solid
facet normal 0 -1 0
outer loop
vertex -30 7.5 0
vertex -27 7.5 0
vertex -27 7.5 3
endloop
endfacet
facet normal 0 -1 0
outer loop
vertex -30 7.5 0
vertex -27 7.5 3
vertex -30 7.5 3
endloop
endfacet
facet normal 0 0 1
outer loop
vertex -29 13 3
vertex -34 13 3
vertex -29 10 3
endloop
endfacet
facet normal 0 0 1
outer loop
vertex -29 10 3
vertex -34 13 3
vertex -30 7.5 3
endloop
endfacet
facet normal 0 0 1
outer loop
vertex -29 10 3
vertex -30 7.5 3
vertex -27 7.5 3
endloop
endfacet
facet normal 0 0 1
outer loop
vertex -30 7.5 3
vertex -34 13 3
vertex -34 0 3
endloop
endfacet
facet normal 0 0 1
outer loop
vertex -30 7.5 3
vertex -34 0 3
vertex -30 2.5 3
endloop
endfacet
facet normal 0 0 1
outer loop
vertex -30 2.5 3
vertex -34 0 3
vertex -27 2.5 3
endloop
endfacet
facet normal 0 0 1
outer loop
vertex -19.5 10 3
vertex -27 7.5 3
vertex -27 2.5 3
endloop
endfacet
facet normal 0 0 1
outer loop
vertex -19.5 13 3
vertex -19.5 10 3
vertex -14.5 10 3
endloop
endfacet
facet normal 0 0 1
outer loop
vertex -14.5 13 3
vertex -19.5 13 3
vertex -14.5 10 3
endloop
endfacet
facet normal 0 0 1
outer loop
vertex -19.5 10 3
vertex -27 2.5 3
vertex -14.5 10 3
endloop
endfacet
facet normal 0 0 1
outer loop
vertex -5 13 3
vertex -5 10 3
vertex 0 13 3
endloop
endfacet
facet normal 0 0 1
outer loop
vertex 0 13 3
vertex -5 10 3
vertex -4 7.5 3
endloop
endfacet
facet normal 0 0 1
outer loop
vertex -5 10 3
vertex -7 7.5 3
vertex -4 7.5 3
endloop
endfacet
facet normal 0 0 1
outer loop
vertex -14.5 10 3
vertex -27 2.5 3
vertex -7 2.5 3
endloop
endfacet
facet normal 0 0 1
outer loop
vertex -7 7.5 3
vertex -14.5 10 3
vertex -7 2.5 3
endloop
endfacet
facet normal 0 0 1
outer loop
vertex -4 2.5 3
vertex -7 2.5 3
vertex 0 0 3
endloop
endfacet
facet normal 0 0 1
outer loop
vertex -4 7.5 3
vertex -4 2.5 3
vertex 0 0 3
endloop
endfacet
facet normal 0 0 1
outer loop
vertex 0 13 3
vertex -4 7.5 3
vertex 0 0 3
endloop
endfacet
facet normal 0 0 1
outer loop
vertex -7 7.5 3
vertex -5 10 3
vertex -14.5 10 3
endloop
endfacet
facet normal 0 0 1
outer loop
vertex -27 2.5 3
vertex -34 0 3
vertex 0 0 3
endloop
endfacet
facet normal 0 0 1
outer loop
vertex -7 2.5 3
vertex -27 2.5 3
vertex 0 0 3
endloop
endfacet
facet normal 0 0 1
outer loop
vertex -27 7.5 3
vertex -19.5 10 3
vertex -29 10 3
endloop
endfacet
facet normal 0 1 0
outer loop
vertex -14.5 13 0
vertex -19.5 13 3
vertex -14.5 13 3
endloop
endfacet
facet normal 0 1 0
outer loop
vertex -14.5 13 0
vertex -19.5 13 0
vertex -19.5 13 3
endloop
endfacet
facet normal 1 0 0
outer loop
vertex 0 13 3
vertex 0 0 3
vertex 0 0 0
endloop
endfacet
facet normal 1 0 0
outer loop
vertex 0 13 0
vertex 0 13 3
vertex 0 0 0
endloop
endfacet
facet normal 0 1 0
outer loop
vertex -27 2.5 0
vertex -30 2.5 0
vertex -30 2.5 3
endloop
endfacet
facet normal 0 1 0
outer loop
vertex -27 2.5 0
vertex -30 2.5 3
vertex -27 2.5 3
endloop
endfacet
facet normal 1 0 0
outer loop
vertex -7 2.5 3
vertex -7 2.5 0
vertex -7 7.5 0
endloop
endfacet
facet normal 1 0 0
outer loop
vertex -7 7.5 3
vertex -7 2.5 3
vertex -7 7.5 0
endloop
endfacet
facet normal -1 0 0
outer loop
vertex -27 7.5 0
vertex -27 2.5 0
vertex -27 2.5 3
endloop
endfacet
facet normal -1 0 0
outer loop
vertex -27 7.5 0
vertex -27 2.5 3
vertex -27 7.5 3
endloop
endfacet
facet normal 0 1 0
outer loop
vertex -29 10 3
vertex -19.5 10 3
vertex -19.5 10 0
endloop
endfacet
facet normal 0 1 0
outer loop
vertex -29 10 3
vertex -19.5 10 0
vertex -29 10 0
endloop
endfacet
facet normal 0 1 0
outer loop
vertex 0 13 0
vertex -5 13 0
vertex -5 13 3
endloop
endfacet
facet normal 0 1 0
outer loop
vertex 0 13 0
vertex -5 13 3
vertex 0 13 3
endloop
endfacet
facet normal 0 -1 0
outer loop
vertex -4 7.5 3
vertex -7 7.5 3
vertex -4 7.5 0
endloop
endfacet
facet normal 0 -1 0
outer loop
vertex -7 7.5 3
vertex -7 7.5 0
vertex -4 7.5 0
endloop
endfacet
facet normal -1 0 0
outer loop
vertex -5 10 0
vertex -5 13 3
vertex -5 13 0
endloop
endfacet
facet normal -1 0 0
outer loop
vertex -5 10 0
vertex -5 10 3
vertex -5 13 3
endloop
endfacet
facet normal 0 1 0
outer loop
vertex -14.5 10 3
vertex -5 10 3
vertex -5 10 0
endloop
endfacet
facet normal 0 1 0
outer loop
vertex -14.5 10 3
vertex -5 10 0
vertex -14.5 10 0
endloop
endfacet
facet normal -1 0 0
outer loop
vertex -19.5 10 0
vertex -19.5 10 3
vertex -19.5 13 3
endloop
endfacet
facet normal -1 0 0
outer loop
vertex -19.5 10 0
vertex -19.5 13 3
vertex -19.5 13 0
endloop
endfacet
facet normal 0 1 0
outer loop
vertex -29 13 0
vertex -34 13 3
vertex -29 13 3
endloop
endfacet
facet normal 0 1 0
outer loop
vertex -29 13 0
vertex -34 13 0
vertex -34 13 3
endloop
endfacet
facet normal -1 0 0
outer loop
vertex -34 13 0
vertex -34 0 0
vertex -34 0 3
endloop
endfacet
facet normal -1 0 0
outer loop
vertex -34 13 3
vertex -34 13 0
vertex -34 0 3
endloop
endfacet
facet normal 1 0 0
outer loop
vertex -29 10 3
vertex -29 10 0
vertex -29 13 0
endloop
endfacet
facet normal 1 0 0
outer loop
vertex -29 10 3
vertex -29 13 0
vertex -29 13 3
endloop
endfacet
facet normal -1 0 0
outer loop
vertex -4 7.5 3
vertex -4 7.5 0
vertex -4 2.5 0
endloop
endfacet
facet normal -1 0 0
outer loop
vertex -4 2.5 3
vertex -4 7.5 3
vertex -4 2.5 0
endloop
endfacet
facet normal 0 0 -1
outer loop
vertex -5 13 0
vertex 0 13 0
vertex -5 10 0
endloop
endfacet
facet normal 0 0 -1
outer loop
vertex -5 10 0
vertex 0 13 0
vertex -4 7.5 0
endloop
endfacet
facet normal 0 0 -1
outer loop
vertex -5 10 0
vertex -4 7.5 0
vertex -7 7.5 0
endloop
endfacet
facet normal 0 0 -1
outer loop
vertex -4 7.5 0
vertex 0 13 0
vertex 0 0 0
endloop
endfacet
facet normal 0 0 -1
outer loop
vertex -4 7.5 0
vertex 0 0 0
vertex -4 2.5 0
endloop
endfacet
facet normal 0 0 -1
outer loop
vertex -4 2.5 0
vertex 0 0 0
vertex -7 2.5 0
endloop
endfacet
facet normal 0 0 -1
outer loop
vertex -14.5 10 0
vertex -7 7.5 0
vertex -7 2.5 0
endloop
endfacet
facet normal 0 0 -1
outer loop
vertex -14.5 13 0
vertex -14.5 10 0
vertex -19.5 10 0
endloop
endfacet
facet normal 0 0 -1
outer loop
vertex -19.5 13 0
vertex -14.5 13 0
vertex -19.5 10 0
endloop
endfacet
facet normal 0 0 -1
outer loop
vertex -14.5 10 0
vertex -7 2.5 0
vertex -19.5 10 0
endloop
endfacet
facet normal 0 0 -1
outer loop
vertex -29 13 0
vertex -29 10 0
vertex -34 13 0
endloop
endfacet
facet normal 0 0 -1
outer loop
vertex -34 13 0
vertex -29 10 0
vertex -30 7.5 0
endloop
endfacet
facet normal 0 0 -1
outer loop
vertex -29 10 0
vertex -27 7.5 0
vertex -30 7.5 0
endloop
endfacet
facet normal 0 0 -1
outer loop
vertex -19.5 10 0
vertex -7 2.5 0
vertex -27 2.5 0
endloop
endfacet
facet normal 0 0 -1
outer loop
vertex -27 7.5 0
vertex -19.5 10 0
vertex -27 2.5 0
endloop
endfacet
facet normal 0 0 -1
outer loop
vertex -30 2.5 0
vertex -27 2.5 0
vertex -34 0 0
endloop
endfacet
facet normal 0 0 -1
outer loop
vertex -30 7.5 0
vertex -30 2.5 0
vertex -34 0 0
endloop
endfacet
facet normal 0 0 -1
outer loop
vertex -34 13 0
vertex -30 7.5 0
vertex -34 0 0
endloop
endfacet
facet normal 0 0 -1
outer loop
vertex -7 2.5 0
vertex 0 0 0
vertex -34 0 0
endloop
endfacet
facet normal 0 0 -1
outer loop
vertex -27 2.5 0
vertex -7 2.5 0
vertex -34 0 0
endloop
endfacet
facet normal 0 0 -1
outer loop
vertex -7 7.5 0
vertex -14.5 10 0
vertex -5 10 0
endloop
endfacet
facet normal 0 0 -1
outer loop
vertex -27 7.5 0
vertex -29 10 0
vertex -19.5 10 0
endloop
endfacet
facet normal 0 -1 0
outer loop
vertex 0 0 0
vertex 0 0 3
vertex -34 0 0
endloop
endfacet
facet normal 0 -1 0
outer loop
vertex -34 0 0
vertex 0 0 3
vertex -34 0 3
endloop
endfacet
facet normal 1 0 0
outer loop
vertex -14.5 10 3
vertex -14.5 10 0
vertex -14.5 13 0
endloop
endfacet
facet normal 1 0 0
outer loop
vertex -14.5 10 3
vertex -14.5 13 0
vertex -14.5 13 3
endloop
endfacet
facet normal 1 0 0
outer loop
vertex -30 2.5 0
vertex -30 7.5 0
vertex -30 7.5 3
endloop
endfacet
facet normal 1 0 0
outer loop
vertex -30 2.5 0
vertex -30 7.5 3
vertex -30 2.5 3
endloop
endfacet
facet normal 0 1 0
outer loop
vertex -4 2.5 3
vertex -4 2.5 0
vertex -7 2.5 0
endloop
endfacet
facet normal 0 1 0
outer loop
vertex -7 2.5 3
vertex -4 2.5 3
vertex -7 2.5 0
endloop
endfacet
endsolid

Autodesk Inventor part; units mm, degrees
ref_plane "YZ Plane" through (0, 0, 0) normal (1, 0, 0) x (0, 1, 0)
ref_plane "XZ Plane" through (0, 0, 0) normal (0, 1, 0) x (-1, 0, 0)
ref_plane "XY Plane" through (0, 0, 0) normal (0, 0, 1) x (1, 0, 0)
sketch "Sketch1" plane through (0, 0, 0) normal (0, 1, 0) x (-1, 0, 0)
  line L0 (0, 0) -> (34, 0)
  line L1 (34, 0) -> (34, 3)
  line L2 (34, 3) -> (0, 3)
  line L3 (0, 3) -> (0, 0)
  dimension "d0" = 34
  dimension "d1" = 3
extrude "Extrusion1" add sketch "Sketch1" along normal blind 10
sketch "Sketch2" plane through (0, 10, 0) normal (0, 1, 0) x (1, 0, 0)
  line L0 (-34, -3) -> (0, -3) projected
  line L1 (-34, 0) -> (-29, 0)
  line L2 (-29, 0) -> (-29, -3)
  line L3 (-29, -3) -> (-34, -3)
  line L4 (-34, -3) -> (-34, 0)
  line L5 (-5, 0) -> (0, 0)
  line L6 (0, 0) -> (0, -3)
  line L7 (0, -3) -> (-5, -3)
  line L8 (-5, -3) -> (-5, 0)
  line L9 (-19.5, 0) -> (-14.5, 0)
  line L10 (-14.5, 0) -> (-14.5, -3)
  line L11 (-14.5, -3) -> (-19.5, -3)
  line L12 (-19.5, -3) -> (-19.5, 0)
  dimension "d4" = 3
  dimension "d5" = 5
  dimension "d6" = 3
  dimension "d7" = 5
  dimension "d8" = 3
  dimension "d9" = 5
  dimension "d10" = 9.5
extrude "Extrusion2" add sketch "Sketch2" along normal blind 3
sketch "Sketch4" plane through (0, 0, 0) normal (0, 0, -1) x (-1, 0, 0)
  line L0 (34, 0) -> (34, 13) projected
  line L1 (30, 2.5) -> (27, 2.5)
  line L2 (27, 2.5) -> (27, 7.5)
  line L3 (27, 7.5) -> (30, 7.5)
  line L4 (30, 7.5) -> (30, 2.5)
  line L5 (0, 0) -> (34, 0) projected
  line L6 (0, 0) -> (0, 13) projected
  line L7 (17, 0) -> (17, 25.0309) construction
  line L8 (7, 2.5) -> (7, 7.5)
  line L9 (4, 2.5) -> (7, 2.5)
  line L10 (7, 7.5) -> (4, 7.5)
  line L11 (4, 7.5) -> (4, 2.5)
  line L12 (19.5, 10) -> (29, 10) projected
  dimension "d17" = 3
  dimension "d18" = 5
  dimension "d22" = 2.5
  dimension "d23" = 4
  dimension "d25" = 10
extrude "Extrusion4" cut sketch "Sketch4" against normal blind 3
equation "\"d22\" = -0.5 * d18 + 0.5 * d25"
properties part number "link2p1press" material "Glass"
